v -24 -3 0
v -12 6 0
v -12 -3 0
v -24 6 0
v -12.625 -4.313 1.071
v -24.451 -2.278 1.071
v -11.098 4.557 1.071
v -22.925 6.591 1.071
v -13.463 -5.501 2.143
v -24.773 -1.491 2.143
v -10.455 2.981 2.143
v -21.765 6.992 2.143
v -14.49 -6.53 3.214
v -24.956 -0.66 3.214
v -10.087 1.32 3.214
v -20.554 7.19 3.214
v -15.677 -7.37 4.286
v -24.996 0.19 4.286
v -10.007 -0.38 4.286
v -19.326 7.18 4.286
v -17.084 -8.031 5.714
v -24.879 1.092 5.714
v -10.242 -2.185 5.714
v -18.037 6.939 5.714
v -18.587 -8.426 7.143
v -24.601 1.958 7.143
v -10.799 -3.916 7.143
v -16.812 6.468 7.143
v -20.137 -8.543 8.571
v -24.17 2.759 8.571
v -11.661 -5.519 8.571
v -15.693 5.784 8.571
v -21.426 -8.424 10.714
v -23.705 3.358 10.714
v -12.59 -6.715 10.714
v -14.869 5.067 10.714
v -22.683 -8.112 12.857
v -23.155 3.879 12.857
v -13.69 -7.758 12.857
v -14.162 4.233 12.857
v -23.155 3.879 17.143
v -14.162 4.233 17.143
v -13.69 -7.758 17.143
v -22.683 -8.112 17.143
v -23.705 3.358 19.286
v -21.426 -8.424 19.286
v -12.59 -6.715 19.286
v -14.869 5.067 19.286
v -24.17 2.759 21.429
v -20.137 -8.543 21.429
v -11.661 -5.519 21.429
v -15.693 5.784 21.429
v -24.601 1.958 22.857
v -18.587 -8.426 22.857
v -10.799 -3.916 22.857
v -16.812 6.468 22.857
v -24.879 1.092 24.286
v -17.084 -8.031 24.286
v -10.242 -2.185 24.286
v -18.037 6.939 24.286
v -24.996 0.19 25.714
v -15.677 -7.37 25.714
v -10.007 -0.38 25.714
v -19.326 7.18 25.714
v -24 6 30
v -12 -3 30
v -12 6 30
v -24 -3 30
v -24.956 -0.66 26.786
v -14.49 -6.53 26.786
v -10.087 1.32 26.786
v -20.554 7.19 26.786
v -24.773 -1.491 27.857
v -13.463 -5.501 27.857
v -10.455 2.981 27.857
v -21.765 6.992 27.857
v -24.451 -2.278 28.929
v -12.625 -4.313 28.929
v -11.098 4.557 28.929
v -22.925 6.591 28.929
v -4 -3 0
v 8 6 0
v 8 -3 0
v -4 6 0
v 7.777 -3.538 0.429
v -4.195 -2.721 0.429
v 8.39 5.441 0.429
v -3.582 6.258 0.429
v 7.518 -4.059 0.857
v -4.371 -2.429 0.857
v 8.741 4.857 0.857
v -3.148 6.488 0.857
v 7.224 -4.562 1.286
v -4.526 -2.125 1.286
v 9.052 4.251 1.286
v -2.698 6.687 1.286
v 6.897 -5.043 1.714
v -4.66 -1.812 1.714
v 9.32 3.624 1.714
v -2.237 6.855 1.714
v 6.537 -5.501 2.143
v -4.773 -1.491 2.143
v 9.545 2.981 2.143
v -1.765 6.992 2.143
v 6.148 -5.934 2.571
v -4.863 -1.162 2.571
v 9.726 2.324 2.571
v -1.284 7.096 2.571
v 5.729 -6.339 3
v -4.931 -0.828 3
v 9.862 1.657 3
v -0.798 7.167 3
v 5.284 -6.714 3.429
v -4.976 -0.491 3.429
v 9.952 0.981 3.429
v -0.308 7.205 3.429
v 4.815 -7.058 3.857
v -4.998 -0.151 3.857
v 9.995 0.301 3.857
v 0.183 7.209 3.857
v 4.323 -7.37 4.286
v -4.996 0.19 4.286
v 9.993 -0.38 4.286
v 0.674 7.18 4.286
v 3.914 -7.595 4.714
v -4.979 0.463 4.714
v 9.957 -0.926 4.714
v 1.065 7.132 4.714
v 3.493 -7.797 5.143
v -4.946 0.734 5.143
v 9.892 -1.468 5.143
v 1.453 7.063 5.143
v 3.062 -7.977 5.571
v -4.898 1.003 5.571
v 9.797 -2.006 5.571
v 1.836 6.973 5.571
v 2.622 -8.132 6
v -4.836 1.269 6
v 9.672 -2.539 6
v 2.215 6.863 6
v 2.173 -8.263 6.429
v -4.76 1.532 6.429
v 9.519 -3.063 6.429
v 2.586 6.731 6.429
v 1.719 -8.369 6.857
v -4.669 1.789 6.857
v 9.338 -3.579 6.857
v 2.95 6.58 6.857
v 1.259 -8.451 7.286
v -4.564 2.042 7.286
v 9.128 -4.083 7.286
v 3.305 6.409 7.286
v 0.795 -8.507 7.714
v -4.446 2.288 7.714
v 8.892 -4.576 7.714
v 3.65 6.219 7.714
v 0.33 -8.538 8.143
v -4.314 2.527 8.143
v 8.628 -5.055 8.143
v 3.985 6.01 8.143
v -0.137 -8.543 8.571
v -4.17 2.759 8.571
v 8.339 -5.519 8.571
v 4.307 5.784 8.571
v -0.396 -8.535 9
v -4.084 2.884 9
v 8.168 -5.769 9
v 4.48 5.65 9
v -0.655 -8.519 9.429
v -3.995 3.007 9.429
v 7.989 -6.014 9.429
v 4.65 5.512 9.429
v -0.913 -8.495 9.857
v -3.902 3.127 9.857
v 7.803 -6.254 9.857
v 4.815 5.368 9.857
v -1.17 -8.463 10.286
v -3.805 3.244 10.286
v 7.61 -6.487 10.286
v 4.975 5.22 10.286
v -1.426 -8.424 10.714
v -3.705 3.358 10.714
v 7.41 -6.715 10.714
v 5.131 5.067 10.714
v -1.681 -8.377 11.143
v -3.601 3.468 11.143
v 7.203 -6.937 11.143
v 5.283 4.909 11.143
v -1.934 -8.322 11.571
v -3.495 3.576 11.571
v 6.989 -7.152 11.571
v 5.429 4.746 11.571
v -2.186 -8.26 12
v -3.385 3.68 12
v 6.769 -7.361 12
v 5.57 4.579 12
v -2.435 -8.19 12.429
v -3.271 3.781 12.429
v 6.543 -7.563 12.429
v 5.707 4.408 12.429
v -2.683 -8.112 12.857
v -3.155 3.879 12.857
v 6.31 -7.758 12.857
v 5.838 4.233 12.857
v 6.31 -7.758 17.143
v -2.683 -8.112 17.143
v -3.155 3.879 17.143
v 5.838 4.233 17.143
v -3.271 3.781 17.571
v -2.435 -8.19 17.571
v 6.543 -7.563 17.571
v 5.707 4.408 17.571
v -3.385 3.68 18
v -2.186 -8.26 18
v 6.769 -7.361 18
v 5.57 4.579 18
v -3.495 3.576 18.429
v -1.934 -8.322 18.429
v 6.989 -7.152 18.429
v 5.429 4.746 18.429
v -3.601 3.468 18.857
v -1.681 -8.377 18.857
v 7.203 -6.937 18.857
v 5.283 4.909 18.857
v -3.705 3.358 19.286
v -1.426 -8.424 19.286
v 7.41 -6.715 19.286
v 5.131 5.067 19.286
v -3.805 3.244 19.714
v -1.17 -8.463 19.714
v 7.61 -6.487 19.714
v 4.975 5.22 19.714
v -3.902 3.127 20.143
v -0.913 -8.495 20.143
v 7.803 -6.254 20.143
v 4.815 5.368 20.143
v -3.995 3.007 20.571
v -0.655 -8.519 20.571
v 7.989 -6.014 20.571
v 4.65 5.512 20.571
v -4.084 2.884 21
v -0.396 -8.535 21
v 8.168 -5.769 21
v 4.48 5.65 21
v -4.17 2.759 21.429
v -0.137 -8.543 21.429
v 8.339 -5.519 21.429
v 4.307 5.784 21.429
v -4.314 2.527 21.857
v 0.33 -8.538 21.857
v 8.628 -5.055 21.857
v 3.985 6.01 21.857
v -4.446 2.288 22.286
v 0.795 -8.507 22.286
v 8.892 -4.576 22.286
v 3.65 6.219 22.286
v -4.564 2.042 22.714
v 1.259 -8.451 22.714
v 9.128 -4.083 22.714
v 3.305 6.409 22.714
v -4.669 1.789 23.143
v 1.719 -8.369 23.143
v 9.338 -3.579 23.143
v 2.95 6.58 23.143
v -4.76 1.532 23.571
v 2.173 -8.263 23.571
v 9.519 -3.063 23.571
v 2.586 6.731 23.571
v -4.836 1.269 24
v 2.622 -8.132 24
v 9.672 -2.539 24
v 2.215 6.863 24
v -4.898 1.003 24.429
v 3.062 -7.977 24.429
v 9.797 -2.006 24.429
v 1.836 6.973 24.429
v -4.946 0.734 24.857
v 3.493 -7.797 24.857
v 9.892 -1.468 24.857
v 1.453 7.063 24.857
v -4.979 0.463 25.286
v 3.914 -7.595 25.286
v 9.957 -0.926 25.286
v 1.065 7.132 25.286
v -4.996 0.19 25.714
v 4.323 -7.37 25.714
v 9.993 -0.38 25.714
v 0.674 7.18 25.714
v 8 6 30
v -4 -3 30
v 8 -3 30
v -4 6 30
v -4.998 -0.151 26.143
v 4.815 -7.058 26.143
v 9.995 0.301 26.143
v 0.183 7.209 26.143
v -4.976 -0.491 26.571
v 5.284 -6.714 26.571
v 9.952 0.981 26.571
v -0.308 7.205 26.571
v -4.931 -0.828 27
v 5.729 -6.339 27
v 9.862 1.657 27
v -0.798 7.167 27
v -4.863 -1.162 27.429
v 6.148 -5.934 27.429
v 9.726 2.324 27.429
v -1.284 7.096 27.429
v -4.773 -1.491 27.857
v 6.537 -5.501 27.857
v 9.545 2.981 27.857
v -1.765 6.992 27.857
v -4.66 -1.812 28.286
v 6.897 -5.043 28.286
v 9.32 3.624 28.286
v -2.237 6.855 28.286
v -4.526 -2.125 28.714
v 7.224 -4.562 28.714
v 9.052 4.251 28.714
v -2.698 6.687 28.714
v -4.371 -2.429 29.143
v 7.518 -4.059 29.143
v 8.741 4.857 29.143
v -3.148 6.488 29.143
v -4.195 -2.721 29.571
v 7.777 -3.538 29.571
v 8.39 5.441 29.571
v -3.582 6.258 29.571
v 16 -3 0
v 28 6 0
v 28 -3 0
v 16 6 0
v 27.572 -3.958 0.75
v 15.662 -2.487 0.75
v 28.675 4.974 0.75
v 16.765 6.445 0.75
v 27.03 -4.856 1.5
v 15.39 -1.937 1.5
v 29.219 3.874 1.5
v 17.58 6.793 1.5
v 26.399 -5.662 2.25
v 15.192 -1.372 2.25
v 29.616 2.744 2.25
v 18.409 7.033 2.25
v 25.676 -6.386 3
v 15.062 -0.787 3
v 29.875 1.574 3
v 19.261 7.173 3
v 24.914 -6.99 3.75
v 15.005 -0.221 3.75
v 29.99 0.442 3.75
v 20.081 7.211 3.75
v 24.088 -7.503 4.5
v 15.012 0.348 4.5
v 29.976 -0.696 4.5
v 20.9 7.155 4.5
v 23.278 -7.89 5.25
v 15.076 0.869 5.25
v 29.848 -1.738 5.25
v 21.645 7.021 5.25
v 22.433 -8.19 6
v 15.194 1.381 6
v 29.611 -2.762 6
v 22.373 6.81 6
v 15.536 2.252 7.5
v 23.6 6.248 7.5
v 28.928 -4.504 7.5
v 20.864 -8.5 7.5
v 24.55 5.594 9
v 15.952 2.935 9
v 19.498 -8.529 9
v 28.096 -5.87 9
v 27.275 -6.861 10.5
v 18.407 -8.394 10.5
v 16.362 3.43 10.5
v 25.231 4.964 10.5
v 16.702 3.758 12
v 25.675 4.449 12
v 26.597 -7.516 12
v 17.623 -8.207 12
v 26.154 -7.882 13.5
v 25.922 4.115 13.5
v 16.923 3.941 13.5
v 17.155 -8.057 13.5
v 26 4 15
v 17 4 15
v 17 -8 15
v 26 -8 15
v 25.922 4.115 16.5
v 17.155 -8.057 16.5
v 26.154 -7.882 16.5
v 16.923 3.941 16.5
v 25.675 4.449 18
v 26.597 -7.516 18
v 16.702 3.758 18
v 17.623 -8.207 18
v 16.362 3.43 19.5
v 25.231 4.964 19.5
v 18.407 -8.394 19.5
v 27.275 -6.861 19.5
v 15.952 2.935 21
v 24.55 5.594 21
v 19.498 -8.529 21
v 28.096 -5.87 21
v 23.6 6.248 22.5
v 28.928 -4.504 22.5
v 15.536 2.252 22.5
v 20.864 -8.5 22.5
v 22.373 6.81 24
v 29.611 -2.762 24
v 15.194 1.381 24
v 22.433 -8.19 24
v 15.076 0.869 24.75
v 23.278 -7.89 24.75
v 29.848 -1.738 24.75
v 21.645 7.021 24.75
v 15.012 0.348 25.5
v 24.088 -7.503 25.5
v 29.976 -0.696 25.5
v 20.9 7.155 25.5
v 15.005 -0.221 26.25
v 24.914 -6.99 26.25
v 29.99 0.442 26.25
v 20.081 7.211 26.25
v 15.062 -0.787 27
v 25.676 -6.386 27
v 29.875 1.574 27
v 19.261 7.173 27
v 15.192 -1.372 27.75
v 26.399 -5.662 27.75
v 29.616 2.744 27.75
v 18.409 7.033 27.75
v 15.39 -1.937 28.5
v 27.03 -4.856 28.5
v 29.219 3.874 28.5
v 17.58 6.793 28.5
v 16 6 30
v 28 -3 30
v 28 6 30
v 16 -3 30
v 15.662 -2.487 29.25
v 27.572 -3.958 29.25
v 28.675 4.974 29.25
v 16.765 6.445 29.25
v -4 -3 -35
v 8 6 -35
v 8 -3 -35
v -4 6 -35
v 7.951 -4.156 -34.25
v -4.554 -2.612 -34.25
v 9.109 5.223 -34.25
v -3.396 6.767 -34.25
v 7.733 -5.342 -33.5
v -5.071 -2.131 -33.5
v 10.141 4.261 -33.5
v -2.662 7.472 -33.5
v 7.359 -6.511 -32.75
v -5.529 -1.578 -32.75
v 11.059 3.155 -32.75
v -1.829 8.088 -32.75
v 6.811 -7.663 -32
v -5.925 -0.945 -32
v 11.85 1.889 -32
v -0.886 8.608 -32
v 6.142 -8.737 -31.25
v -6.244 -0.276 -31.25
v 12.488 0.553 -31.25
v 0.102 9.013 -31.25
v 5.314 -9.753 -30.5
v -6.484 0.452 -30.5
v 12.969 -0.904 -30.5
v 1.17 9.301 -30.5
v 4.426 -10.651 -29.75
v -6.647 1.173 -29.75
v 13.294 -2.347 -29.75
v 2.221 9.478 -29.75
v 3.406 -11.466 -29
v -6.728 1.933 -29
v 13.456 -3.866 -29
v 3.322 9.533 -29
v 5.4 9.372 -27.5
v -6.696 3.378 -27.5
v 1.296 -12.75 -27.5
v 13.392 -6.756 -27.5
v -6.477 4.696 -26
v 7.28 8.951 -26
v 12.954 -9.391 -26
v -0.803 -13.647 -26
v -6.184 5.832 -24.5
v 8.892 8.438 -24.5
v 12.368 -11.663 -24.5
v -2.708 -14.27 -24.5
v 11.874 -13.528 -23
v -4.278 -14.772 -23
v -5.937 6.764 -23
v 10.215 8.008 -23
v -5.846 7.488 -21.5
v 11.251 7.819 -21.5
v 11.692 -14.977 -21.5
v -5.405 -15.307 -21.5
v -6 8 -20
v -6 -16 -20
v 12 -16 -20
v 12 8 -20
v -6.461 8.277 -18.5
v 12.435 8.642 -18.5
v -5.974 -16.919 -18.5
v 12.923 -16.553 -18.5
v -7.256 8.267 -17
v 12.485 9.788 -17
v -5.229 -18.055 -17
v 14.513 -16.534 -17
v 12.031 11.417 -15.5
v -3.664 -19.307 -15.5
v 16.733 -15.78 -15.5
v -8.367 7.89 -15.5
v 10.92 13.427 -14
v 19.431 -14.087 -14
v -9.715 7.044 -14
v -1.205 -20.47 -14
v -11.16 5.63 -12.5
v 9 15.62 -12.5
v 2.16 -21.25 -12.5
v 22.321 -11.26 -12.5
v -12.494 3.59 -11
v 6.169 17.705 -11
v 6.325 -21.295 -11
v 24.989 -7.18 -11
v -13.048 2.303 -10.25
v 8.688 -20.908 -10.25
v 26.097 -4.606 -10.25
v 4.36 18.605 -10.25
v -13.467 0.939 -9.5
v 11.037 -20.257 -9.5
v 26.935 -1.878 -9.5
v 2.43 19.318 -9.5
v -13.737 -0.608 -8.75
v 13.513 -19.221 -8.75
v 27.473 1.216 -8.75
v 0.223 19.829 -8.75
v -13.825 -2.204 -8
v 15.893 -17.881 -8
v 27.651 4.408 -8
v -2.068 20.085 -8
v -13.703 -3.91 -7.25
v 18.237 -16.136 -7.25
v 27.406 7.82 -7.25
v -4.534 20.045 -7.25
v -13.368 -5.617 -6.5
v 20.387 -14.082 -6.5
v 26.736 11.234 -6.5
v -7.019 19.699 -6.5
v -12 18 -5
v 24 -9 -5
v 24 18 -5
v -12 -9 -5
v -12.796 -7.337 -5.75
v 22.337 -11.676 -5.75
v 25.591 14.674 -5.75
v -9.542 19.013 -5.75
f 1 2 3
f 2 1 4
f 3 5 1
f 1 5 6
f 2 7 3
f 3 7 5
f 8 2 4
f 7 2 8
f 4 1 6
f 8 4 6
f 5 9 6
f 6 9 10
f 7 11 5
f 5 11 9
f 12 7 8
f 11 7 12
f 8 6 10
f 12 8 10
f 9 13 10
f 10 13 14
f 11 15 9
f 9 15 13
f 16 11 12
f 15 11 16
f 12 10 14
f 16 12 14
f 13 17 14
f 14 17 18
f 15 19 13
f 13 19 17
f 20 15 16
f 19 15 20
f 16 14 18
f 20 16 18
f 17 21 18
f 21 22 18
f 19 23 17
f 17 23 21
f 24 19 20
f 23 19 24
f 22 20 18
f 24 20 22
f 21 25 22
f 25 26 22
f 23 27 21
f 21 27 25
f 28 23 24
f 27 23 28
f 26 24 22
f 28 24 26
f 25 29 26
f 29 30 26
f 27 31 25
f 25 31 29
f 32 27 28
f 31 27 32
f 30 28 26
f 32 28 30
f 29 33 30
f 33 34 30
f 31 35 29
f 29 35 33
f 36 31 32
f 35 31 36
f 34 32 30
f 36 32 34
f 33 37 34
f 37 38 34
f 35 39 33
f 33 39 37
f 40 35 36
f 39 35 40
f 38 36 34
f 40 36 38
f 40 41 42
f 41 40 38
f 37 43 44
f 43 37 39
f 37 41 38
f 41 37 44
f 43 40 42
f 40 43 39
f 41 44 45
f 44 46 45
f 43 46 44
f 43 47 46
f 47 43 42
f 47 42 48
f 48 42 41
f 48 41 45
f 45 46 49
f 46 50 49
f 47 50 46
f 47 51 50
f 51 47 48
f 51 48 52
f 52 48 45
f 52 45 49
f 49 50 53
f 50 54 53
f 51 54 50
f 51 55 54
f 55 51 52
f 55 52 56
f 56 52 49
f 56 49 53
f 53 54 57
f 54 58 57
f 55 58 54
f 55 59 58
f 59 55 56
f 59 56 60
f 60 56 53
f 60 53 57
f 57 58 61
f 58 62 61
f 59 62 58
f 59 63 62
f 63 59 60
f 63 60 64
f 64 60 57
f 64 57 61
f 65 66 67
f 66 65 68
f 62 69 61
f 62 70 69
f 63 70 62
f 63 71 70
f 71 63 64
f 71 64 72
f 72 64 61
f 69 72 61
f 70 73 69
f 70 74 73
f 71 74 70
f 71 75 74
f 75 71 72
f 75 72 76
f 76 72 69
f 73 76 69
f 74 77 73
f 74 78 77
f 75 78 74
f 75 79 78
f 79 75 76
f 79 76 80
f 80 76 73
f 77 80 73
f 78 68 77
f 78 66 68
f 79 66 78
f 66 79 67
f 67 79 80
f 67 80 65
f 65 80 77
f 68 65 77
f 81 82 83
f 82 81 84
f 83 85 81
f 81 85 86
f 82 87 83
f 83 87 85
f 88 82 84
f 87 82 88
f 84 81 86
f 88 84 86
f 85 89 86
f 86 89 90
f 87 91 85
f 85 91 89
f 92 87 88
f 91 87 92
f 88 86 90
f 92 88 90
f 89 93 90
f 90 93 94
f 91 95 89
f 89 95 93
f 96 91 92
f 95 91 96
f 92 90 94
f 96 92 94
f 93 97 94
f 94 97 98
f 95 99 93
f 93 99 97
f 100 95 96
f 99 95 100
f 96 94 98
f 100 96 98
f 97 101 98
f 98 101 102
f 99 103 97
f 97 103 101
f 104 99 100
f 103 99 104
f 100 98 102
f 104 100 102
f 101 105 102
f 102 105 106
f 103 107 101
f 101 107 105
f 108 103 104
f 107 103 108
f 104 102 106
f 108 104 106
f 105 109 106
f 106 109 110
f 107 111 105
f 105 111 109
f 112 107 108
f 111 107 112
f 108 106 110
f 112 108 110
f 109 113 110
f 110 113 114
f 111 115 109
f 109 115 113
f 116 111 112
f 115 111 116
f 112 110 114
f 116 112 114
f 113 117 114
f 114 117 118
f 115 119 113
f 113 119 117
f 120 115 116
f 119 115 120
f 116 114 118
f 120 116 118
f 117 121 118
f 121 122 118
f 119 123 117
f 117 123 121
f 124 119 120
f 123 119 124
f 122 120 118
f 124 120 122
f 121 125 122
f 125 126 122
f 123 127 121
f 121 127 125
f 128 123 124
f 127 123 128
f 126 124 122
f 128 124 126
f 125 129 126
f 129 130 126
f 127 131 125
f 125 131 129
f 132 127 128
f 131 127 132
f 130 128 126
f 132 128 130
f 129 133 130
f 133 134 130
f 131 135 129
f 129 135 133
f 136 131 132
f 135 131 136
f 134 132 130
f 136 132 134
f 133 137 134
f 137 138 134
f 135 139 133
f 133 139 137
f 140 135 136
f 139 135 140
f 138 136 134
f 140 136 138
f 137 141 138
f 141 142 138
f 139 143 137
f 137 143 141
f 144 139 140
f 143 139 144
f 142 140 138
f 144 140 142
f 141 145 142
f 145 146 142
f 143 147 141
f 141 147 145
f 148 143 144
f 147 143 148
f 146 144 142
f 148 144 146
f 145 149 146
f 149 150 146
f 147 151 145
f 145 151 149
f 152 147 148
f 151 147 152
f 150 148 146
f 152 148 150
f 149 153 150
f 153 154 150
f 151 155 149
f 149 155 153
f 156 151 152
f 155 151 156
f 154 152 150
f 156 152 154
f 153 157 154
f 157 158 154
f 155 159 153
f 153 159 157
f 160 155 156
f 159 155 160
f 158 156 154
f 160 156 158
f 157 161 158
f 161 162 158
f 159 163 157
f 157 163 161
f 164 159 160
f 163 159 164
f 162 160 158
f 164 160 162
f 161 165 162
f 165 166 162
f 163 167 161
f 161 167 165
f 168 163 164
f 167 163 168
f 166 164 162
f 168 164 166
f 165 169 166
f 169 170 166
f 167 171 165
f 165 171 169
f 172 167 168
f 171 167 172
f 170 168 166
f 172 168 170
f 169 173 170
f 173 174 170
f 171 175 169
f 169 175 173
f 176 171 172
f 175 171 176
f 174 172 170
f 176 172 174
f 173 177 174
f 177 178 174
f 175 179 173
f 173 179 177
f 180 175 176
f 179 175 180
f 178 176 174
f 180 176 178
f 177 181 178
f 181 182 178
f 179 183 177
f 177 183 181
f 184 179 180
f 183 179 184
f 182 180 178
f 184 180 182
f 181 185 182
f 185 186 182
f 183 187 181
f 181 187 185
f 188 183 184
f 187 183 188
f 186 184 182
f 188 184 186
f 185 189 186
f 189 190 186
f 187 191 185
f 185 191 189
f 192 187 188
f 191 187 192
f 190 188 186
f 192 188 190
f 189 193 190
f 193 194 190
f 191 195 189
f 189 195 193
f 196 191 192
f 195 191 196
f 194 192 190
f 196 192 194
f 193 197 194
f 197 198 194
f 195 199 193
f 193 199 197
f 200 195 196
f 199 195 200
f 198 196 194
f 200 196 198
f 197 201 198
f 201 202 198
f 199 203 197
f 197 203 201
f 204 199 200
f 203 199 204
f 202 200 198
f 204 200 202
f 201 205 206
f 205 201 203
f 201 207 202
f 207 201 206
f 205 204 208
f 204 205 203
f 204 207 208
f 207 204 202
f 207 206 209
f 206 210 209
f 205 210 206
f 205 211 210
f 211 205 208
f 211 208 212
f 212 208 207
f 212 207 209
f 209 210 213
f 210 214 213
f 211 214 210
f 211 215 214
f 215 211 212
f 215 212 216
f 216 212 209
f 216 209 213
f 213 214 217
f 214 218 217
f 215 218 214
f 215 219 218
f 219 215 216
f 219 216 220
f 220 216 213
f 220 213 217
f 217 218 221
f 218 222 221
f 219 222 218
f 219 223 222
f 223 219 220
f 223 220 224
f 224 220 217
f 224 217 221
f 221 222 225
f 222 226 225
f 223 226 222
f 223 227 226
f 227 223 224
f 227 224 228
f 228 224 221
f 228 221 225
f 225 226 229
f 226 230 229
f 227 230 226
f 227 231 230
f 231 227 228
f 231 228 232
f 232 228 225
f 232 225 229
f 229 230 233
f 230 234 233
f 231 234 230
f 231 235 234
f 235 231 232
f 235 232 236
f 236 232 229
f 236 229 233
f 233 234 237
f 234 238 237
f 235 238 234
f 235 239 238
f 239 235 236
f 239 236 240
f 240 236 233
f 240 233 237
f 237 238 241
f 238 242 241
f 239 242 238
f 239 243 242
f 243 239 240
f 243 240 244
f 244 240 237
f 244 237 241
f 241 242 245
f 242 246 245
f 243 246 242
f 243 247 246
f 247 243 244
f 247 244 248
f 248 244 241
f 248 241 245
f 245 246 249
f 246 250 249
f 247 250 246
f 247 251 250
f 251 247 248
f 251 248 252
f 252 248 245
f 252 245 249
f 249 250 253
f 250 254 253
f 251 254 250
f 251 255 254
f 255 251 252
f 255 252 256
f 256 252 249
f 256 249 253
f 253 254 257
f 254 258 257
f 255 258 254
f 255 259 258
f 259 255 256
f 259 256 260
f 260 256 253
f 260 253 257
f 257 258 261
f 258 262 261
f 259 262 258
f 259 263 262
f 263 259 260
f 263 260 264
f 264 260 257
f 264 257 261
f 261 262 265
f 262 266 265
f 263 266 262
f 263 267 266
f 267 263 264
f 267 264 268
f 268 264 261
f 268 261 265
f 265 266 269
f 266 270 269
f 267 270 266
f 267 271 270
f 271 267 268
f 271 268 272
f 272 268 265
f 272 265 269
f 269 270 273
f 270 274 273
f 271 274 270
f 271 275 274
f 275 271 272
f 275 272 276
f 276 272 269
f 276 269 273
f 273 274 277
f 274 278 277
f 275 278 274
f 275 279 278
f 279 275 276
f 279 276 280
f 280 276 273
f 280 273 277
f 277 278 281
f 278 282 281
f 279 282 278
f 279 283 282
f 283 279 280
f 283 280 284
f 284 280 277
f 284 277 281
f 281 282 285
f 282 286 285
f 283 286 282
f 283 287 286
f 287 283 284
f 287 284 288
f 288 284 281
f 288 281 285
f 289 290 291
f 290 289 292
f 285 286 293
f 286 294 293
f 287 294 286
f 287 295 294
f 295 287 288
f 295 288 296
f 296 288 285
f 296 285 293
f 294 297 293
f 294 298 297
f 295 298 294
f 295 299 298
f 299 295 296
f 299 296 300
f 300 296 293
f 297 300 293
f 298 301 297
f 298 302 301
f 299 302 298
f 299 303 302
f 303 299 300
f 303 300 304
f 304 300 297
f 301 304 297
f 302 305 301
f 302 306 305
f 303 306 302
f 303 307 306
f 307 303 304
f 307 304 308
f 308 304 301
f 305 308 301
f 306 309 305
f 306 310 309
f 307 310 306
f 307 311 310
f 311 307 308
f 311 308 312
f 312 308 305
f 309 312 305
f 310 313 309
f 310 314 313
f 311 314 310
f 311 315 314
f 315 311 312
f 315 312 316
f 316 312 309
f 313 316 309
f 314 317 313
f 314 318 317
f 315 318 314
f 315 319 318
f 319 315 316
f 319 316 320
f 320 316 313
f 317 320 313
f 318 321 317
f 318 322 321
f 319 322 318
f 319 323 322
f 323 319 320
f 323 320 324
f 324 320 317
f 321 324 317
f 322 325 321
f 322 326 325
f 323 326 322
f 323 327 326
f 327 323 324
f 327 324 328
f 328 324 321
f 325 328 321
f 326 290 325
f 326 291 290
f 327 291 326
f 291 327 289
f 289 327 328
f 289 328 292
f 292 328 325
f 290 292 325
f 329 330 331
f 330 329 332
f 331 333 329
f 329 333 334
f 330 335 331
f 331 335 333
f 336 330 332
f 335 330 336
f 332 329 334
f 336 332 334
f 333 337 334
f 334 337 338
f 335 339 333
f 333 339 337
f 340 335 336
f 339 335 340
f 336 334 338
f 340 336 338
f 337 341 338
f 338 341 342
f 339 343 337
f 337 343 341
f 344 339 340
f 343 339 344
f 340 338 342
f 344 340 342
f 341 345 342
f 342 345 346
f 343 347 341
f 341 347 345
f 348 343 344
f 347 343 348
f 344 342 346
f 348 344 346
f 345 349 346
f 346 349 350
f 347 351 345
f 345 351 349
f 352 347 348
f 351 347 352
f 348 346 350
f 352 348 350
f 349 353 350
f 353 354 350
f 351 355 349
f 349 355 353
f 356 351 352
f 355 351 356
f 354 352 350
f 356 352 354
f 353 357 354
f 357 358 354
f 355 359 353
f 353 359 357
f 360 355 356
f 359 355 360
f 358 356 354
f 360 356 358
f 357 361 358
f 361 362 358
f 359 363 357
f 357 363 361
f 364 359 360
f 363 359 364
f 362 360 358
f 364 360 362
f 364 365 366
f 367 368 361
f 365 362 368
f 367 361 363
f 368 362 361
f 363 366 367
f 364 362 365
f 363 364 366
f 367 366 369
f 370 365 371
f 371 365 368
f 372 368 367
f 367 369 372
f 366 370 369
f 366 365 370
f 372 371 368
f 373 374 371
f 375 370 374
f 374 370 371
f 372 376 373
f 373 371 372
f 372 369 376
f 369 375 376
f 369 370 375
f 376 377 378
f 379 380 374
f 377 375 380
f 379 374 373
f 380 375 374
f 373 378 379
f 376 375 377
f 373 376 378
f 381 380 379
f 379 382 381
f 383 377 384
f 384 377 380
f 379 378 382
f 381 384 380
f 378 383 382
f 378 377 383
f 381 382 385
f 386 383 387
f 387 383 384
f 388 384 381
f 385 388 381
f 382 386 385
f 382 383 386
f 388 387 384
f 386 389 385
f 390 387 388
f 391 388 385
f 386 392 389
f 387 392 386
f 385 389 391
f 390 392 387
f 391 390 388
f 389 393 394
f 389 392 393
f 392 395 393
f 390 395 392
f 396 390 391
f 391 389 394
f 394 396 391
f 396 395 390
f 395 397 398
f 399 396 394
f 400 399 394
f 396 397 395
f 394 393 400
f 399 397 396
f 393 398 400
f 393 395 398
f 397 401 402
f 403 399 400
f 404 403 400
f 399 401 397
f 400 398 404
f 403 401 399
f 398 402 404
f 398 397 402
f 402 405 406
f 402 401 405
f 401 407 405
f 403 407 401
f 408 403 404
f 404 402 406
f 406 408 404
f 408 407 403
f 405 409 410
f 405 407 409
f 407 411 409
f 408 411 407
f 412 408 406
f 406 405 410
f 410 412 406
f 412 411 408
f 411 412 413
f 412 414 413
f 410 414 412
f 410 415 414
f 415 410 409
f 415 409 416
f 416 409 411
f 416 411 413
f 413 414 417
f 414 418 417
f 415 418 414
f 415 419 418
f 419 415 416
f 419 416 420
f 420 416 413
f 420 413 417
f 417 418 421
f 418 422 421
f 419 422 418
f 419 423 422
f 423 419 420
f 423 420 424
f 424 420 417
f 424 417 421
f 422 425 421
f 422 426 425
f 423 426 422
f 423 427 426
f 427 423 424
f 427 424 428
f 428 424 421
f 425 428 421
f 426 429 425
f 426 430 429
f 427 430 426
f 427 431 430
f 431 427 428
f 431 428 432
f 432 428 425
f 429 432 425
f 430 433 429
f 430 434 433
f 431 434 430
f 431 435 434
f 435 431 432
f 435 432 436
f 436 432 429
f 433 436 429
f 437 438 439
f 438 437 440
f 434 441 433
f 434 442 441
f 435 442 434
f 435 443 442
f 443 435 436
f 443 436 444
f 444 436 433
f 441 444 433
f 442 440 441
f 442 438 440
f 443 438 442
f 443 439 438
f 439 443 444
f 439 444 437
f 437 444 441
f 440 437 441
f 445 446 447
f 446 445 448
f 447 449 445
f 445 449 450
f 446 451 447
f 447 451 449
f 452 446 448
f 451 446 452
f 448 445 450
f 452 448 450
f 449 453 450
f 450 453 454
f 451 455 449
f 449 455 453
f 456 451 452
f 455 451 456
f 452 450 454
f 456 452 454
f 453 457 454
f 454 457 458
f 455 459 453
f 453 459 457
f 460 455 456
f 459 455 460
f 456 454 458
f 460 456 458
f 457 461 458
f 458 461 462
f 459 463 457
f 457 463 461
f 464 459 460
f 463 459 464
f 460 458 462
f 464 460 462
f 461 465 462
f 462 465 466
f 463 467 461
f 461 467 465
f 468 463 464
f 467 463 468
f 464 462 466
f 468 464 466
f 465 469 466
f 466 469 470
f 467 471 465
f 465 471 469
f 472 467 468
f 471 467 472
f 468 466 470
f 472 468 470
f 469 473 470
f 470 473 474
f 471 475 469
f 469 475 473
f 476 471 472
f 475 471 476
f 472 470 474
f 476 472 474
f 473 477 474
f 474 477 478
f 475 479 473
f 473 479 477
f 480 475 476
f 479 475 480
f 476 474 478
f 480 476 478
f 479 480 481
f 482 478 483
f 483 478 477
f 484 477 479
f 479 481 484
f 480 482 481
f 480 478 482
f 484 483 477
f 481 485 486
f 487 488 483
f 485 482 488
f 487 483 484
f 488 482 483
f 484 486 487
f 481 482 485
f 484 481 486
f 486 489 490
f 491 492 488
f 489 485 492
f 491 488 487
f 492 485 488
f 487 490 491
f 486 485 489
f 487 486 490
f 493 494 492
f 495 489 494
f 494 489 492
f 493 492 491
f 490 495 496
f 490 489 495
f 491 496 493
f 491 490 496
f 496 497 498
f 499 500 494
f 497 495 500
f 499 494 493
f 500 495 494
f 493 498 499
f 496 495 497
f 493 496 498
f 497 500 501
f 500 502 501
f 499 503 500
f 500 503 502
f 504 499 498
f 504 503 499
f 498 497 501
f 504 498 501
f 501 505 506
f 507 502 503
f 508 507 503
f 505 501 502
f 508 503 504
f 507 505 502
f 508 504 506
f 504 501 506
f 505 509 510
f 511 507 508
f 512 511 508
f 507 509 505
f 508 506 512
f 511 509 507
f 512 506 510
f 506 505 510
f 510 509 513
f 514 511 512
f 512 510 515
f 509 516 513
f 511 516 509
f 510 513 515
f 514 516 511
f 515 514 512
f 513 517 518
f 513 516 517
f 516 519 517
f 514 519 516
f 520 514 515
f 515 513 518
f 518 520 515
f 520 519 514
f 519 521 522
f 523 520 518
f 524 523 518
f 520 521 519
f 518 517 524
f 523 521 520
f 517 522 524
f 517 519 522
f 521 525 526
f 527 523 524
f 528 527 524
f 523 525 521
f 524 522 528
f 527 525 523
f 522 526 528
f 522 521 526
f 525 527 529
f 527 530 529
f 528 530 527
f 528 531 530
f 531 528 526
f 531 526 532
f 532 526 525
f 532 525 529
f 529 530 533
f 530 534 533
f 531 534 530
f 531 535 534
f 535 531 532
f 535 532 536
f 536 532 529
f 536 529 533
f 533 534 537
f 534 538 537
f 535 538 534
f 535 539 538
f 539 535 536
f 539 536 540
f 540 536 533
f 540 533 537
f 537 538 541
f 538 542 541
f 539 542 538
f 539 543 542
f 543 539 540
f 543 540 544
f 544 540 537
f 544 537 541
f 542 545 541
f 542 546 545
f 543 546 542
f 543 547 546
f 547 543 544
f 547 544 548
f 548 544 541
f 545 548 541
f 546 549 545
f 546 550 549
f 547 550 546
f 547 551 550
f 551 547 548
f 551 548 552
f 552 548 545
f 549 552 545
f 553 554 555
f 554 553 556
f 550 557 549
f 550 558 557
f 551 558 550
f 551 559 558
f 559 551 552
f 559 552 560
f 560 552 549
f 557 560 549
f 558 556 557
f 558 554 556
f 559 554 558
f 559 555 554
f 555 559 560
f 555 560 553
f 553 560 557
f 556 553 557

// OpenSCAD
  //Linear Extrude with Twist as an interpolated function
  // This module does not need to be modified, 
  //  - unless default parameters want to be changed 
  //  - or additional parameters want to be forwarded (e.g. slices,...)
  module linear_extrude_ft(height=1,isteps=20,scale=1,slices=0){
      //union of piecewise generated extrudes
      union(){
          for(i = [ 0: 1: isteps-1]){
              //each new piece needs to be adjusted for height
              translate([0,0,i*height/isteps])
                linear_extrude(
                  height=height/isteps,
                  twist=f_left((i+1)/isteps)-f_left((i)/isteps),
                  scale=(1-(1-scale)*(i+1)/isteps)/(1-(1-scale)*i/isteps),
                  slices=slices
                )
                  //Rotate to next start point
                  rotate([0,0,-f_left(i/isteps)])
                    //Scale to end of last piece size   
                    scale(1-(1-scale)*(i/isteps))
                      obj2D_left();
          }
      }
  }
  // This function defines the twist function
  //  - Function name must not be modified
  //  - Modify the contents/return value to define the function
  function f_left(x) = 
      let(twist=90,span=180,start=0)
      twist*sin(x*span+start);
  // This module defines the base 2D object to be extruded
  //  - Function name must not be modified
  //  - Modify the contents to define the base 2D object
  module obj2D_left(){
     translate([-4,-3]) 
       square([12,9]);
  }
  
  //Left rendered object demonstrating the interpolation steps
  translate([-20,0])
  linear_extrude_ft(height=30,isteps=7);
  
  //Center rendered object demonstrating effect of slices
  linear_extrude_ft(height=30,isteps=7,slices=10);
  
  //Right rendered object with default parameters
  translate([20,0])
  linear_extrude_ft(height=30);
  
  //Bottom rendered object demonstrating the scale inclusion
  translate([0,0,-35])
  linear_extrude_ft(height=30,scale=3);
